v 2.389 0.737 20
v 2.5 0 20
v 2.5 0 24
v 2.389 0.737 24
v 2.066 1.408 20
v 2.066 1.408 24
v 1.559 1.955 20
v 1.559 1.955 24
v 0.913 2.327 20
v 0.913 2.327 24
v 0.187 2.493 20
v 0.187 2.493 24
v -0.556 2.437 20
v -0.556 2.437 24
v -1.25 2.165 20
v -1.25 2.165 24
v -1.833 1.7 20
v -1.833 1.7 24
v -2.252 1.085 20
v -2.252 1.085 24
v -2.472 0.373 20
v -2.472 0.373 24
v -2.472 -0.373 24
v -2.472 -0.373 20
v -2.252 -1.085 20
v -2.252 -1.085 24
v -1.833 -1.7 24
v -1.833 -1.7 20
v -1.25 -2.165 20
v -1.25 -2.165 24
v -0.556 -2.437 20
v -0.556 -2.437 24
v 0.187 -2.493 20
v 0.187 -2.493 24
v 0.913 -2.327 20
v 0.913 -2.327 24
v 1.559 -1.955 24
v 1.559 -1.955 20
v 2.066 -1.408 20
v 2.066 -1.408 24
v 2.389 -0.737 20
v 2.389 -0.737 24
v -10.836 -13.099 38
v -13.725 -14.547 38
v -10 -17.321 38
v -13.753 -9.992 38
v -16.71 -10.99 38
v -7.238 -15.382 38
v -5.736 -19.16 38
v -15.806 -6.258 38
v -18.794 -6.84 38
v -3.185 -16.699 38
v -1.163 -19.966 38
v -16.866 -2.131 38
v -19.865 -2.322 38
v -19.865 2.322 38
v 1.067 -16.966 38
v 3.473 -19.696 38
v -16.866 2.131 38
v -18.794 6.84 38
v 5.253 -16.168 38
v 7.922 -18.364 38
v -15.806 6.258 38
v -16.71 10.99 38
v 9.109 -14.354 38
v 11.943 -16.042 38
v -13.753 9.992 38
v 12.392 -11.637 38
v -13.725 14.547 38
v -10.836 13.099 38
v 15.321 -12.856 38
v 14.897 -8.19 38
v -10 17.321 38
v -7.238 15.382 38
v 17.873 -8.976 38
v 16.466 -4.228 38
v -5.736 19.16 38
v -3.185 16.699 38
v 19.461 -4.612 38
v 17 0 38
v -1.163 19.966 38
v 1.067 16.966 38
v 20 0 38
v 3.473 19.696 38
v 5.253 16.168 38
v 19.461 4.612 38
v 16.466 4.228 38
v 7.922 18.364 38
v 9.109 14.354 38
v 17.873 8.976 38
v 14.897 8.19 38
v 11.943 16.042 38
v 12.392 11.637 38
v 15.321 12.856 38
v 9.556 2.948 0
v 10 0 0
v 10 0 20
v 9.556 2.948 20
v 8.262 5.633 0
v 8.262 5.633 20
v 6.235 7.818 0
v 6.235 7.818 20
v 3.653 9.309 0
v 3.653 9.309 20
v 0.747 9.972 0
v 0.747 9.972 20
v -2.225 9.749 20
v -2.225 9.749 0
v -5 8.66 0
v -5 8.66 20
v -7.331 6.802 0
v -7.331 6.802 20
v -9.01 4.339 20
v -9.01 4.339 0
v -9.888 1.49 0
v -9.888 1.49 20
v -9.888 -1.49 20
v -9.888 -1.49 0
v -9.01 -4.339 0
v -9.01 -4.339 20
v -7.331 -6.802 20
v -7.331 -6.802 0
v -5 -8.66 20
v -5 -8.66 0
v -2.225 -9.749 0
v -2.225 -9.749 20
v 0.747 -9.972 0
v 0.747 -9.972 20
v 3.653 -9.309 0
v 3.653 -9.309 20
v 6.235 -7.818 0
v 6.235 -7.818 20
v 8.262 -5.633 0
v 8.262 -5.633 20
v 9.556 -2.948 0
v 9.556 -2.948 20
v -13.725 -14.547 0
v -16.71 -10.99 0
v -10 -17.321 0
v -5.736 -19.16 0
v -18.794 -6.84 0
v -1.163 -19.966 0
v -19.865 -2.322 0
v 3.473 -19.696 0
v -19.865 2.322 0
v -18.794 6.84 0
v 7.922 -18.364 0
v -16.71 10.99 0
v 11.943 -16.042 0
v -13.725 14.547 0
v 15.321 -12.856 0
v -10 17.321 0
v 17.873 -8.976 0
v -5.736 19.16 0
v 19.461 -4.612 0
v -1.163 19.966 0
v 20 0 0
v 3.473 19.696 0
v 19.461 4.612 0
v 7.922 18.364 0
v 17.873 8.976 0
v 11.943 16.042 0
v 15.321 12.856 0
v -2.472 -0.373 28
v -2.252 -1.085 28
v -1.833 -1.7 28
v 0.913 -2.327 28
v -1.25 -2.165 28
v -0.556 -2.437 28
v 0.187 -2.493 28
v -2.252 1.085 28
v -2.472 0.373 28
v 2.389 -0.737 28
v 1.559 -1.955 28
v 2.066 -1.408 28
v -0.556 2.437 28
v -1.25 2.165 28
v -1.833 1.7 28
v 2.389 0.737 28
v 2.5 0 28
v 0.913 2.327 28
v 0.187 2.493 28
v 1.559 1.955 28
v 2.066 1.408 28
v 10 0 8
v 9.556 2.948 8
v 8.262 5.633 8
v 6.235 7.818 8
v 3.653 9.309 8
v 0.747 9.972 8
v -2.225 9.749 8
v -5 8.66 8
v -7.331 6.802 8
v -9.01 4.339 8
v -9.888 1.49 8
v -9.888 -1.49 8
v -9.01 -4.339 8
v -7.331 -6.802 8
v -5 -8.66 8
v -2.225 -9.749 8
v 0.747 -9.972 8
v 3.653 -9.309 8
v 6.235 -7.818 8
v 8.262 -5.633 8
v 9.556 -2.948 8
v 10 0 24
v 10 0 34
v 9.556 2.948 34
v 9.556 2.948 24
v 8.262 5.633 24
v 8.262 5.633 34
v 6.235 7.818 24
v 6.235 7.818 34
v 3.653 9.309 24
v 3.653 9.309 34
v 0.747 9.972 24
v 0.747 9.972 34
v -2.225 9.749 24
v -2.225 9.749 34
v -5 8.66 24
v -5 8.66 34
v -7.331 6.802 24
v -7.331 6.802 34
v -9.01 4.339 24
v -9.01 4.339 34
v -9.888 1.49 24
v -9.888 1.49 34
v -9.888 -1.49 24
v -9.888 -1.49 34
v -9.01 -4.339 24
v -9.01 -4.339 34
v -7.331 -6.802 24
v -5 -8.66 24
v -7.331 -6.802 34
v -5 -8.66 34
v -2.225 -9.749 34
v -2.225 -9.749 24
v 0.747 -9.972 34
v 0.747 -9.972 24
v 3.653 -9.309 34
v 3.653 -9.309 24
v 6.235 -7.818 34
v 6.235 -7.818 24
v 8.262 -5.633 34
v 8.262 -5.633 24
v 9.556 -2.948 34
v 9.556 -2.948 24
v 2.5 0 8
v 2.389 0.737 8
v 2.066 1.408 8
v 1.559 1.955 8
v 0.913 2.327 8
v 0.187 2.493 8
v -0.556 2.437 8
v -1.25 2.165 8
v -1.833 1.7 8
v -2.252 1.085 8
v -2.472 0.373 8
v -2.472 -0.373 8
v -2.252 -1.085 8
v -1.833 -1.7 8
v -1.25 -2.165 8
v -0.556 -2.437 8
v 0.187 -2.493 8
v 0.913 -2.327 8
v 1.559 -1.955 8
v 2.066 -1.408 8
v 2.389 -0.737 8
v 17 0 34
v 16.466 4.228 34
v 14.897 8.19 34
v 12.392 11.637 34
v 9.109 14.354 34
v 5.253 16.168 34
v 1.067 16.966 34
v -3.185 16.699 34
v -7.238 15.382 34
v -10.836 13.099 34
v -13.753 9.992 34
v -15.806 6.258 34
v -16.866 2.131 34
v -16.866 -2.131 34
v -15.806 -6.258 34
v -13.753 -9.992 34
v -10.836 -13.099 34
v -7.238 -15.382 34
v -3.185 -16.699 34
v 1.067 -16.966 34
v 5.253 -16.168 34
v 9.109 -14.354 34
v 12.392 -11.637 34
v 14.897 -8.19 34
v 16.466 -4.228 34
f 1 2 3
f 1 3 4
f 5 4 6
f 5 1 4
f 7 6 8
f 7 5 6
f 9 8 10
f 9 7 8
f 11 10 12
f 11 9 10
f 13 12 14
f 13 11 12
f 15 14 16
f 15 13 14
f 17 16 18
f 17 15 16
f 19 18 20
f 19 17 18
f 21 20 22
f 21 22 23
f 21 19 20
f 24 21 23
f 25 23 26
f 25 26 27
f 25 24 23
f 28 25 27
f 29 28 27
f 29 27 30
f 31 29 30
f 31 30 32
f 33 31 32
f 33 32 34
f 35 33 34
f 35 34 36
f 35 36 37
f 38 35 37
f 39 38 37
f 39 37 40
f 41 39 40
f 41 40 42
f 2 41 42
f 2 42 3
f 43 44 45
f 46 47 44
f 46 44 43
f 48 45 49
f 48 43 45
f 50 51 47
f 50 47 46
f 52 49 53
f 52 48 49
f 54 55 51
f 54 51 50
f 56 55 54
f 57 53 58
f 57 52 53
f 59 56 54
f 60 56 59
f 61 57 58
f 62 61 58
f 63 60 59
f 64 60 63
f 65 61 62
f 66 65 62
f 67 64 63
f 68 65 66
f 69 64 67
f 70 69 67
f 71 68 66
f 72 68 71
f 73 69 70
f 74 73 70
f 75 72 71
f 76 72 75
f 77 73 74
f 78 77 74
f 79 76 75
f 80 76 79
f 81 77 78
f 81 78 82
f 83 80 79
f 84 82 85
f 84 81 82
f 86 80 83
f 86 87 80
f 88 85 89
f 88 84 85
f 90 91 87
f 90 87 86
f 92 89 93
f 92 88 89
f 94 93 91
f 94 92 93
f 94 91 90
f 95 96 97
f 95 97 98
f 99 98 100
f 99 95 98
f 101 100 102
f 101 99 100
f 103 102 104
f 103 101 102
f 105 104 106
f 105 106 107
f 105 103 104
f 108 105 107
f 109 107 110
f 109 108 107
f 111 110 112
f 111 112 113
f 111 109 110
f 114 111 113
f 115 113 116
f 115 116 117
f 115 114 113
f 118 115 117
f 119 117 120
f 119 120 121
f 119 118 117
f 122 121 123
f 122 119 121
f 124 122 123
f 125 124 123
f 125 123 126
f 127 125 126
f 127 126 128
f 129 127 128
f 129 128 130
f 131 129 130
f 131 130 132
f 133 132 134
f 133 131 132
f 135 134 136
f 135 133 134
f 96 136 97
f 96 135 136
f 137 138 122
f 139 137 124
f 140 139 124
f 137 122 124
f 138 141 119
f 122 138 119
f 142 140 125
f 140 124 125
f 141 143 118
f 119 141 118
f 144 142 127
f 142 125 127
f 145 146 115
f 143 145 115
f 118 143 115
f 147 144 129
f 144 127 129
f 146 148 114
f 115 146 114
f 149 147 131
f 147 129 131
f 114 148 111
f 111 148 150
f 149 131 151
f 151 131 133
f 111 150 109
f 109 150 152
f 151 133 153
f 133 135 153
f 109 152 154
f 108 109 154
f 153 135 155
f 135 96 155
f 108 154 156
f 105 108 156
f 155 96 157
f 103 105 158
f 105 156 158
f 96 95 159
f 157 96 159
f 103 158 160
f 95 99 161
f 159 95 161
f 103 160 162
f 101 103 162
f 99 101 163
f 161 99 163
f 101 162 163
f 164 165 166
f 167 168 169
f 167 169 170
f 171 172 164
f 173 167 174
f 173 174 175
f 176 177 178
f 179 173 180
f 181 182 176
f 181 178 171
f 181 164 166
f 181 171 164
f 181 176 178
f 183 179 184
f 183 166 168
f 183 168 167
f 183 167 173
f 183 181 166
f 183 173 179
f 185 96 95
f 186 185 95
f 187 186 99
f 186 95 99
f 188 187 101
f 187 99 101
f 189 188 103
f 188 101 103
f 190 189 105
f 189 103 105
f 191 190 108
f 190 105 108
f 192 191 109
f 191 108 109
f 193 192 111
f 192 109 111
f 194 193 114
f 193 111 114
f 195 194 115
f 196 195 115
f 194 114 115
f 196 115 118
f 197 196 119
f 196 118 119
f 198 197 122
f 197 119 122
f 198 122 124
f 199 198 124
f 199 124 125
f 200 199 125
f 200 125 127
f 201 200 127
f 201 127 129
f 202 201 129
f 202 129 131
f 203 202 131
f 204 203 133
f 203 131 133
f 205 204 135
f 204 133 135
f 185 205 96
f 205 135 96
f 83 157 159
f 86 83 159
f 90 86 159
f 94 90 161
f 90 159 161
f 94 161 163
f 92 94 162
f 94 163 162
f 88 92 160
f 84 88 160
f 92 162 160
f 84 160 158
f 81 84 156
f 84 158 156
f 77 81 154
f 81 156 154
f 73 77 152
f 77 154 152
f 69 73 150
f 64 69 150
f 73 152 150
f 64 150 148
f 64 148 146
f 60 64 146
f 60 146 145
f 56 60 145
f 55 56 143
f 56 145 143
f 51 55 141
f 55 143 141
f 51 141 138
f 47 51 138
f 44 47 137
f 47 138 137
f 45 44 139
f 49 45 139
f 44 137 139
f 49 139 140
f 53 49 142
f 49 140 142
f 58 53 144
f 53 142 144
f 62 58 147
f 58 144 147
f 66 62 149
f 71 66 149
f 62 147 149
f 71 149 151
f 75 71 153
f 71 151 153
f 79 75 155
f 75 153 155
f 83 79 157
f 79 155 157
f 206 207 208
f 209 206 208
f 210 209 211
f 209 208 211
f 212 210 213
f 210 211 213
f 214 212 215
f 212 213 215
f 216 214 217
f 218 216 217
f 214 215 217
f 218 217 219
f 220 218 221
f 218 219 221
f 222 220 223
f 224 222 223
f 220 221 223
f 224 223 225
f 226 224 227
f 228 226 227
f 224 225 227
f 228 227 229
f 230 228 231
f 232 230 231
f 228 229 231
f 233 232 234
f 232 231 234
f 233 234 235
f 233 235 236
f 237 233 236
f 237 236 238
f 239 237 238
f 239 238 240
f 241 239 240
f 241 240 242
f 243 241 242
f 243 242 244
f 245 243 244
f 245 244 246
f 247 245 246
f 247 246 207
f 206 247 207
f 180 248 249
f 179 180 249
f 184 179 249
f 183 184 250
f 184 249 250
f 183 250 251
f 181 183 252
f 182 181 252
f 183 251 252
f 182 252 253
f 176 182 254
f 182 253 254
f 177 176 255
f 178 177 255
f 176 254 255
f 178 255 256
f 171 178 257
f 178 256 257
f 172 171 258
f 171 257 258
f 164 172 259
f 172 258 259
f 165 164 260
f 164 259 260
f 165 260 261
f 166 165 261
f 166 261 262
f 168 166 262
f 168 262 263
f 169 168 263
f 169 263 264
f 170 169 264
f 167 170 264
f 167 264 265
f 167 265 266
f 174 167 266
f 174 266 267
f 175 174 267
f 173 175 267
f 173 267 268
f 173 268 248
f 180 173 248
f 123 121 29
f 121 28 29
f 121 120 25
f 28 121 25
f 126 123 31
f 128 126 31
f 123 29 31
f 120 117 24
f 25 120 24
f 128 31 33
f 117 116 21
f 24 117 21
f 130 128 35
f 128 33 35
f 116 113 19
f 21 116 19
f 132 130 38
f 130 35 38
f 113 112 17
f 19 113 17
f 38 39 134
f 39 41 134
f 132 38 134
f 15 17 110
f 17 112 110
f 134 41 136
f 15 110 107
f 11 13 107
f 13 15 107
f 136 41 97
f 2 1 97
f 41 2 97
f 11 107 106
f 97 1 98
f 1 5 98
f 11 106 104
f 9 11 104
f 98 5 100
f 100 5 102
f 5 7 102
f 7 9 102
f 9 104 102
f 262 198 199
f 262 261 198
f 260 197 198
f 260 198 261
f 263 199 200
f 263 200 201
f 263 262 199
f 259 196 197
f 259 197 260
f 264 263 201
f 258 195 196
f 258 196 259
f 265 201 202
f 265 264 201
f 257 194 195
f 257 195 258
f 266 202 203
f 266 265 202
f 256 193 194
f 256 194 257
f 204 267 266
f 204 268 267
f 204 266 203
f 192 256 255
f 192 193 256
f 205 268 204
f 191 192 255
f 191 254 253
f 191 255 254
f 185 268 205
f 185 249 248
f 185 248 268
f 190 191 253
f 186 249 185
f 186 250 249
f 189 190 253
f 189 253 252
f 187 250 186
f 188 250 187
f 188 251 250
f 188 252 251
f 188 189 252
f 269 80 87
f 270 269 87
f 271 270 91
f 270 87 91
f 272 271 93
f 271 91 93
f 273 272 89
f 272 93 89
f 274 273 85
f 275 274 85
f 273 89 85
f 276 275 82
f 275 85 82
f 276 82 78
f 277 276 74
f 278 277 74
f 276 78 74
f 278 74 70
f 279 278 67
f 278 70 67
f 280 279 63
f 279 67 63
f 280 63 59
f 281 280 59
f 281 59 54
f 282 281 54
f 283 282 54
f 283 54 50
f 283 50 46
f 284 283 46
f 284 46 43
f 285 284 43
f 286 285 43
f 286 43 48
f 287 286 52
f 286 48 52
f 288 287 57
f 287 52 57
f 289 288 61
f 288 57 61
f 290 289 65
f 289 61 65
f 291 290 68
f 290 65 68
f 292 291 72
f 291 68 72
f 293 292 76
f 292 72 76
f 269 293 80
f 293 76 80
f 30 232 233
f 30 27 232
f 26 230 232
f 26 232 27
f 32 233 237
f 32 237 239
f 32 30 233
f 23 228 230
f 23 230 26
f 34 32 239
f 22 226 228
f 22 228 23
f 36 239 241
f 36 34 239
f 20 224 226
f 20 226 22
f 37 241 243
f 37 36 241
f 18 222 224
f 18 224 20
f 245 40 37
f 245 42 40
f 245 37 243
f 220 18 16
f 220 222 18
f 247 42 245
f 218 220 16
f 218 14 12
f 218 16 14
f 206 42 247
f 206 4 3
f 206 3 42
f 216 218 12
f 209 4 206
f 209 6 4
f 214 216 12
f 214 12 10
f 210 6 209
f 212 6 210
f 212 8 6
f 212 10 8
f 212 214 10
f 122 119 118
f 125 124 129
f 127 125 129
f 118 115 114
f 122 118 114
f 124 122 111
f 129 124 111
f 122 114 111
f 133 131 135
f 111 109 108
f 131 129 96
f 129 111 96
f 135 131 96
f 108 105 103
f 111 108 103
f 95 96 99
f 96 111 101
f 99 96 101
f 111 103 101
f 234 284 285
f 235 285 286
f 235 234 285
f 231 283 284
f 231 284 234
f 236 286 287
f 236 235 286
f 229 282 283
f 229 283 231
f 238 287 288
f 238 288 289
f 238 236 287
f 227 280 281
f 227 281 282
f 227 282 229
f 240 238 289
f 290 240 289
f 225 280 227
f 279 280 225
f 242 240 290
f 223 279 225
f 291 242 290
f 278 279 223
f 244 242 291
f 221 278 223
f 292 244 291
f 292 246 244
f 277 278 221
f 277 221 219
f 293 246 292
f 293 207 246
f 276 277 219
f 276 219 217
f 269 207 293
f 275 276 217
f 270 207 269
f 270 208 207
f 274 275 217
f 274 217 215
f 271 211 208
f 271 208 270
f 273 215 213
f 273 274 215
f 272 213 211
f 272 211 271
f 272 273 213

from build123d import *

# Parameters (mm, degrees)
F0_R     = 20
F0_R_2   = 10
F0_R_3   = 2.5
F1_DEPTH = 38
F2_DEPTH = 20
F3_R     = 10
F3_R_2   = 2.5
F4_DEPTH = 14
F3_R_3   = 17
F5_DEPTH = 4
F6_DEPTH = 8
F7_DEPTH = 28


with BuildPart() as f1:
    # F0 (on Top) → F1 (new body)
    with BuildSketch(Plane.XY):
        Circle(F0_R)
        Circle(F0_R_2, mode=Mode.SUBTRACT)
        Circle(F0_R_2)
        Circle(F0_R_3, mode=Mode.SUBTRACT)
    extrude(amount=F1_DEPTH)

    # F0 (on Top) → F2 (cut)
    with BuildSketch(Plane.XY):
        Circle(F0_R_2)
        Circle(F0_R_3, mode=Mode.SUBTRACT)
    extrude(amount=F2_DEPTH, mode=Mode.SUBTRACT)

    # F3 (on face) → F4 (cut)
    with BuildSketch(Plane.XY.offset(38)):
        Circle(F3_R)
        Circle(F3_R_2, mode=Mode.SUBTRACT)
    extrude(amount=-F4_DEPTH, mode=Mode.SUBTRACT)

    # F3 (on face) → F5 (cut)
    with BuildSketch(Plane.XY.offset(38)):
        Circle(F3_R_3)
        Circle(F3_R, mode=Mode.SUBTRACT)
    extrude(amount=-F5_DEPTH, mode=Mode.SUBTRACT)


with BuildPart() as f6:
    # F0 (on Top) → F6 (new body)
    with BuildSketch(Plane.XY):
        Circle(F0_R_2)
        Circle(F0_R_3, mode=Mode.SUBTRACT)
    extrude(amount=F6_DEPTH)

    # F0 (on Top) → F7 (join)
    with BuildSketch(Plane.XY):
        Circle(F0_R_3)
    extrude(amount=F7_DEPTH)


solid = Compound([f1.part, f6.part])
